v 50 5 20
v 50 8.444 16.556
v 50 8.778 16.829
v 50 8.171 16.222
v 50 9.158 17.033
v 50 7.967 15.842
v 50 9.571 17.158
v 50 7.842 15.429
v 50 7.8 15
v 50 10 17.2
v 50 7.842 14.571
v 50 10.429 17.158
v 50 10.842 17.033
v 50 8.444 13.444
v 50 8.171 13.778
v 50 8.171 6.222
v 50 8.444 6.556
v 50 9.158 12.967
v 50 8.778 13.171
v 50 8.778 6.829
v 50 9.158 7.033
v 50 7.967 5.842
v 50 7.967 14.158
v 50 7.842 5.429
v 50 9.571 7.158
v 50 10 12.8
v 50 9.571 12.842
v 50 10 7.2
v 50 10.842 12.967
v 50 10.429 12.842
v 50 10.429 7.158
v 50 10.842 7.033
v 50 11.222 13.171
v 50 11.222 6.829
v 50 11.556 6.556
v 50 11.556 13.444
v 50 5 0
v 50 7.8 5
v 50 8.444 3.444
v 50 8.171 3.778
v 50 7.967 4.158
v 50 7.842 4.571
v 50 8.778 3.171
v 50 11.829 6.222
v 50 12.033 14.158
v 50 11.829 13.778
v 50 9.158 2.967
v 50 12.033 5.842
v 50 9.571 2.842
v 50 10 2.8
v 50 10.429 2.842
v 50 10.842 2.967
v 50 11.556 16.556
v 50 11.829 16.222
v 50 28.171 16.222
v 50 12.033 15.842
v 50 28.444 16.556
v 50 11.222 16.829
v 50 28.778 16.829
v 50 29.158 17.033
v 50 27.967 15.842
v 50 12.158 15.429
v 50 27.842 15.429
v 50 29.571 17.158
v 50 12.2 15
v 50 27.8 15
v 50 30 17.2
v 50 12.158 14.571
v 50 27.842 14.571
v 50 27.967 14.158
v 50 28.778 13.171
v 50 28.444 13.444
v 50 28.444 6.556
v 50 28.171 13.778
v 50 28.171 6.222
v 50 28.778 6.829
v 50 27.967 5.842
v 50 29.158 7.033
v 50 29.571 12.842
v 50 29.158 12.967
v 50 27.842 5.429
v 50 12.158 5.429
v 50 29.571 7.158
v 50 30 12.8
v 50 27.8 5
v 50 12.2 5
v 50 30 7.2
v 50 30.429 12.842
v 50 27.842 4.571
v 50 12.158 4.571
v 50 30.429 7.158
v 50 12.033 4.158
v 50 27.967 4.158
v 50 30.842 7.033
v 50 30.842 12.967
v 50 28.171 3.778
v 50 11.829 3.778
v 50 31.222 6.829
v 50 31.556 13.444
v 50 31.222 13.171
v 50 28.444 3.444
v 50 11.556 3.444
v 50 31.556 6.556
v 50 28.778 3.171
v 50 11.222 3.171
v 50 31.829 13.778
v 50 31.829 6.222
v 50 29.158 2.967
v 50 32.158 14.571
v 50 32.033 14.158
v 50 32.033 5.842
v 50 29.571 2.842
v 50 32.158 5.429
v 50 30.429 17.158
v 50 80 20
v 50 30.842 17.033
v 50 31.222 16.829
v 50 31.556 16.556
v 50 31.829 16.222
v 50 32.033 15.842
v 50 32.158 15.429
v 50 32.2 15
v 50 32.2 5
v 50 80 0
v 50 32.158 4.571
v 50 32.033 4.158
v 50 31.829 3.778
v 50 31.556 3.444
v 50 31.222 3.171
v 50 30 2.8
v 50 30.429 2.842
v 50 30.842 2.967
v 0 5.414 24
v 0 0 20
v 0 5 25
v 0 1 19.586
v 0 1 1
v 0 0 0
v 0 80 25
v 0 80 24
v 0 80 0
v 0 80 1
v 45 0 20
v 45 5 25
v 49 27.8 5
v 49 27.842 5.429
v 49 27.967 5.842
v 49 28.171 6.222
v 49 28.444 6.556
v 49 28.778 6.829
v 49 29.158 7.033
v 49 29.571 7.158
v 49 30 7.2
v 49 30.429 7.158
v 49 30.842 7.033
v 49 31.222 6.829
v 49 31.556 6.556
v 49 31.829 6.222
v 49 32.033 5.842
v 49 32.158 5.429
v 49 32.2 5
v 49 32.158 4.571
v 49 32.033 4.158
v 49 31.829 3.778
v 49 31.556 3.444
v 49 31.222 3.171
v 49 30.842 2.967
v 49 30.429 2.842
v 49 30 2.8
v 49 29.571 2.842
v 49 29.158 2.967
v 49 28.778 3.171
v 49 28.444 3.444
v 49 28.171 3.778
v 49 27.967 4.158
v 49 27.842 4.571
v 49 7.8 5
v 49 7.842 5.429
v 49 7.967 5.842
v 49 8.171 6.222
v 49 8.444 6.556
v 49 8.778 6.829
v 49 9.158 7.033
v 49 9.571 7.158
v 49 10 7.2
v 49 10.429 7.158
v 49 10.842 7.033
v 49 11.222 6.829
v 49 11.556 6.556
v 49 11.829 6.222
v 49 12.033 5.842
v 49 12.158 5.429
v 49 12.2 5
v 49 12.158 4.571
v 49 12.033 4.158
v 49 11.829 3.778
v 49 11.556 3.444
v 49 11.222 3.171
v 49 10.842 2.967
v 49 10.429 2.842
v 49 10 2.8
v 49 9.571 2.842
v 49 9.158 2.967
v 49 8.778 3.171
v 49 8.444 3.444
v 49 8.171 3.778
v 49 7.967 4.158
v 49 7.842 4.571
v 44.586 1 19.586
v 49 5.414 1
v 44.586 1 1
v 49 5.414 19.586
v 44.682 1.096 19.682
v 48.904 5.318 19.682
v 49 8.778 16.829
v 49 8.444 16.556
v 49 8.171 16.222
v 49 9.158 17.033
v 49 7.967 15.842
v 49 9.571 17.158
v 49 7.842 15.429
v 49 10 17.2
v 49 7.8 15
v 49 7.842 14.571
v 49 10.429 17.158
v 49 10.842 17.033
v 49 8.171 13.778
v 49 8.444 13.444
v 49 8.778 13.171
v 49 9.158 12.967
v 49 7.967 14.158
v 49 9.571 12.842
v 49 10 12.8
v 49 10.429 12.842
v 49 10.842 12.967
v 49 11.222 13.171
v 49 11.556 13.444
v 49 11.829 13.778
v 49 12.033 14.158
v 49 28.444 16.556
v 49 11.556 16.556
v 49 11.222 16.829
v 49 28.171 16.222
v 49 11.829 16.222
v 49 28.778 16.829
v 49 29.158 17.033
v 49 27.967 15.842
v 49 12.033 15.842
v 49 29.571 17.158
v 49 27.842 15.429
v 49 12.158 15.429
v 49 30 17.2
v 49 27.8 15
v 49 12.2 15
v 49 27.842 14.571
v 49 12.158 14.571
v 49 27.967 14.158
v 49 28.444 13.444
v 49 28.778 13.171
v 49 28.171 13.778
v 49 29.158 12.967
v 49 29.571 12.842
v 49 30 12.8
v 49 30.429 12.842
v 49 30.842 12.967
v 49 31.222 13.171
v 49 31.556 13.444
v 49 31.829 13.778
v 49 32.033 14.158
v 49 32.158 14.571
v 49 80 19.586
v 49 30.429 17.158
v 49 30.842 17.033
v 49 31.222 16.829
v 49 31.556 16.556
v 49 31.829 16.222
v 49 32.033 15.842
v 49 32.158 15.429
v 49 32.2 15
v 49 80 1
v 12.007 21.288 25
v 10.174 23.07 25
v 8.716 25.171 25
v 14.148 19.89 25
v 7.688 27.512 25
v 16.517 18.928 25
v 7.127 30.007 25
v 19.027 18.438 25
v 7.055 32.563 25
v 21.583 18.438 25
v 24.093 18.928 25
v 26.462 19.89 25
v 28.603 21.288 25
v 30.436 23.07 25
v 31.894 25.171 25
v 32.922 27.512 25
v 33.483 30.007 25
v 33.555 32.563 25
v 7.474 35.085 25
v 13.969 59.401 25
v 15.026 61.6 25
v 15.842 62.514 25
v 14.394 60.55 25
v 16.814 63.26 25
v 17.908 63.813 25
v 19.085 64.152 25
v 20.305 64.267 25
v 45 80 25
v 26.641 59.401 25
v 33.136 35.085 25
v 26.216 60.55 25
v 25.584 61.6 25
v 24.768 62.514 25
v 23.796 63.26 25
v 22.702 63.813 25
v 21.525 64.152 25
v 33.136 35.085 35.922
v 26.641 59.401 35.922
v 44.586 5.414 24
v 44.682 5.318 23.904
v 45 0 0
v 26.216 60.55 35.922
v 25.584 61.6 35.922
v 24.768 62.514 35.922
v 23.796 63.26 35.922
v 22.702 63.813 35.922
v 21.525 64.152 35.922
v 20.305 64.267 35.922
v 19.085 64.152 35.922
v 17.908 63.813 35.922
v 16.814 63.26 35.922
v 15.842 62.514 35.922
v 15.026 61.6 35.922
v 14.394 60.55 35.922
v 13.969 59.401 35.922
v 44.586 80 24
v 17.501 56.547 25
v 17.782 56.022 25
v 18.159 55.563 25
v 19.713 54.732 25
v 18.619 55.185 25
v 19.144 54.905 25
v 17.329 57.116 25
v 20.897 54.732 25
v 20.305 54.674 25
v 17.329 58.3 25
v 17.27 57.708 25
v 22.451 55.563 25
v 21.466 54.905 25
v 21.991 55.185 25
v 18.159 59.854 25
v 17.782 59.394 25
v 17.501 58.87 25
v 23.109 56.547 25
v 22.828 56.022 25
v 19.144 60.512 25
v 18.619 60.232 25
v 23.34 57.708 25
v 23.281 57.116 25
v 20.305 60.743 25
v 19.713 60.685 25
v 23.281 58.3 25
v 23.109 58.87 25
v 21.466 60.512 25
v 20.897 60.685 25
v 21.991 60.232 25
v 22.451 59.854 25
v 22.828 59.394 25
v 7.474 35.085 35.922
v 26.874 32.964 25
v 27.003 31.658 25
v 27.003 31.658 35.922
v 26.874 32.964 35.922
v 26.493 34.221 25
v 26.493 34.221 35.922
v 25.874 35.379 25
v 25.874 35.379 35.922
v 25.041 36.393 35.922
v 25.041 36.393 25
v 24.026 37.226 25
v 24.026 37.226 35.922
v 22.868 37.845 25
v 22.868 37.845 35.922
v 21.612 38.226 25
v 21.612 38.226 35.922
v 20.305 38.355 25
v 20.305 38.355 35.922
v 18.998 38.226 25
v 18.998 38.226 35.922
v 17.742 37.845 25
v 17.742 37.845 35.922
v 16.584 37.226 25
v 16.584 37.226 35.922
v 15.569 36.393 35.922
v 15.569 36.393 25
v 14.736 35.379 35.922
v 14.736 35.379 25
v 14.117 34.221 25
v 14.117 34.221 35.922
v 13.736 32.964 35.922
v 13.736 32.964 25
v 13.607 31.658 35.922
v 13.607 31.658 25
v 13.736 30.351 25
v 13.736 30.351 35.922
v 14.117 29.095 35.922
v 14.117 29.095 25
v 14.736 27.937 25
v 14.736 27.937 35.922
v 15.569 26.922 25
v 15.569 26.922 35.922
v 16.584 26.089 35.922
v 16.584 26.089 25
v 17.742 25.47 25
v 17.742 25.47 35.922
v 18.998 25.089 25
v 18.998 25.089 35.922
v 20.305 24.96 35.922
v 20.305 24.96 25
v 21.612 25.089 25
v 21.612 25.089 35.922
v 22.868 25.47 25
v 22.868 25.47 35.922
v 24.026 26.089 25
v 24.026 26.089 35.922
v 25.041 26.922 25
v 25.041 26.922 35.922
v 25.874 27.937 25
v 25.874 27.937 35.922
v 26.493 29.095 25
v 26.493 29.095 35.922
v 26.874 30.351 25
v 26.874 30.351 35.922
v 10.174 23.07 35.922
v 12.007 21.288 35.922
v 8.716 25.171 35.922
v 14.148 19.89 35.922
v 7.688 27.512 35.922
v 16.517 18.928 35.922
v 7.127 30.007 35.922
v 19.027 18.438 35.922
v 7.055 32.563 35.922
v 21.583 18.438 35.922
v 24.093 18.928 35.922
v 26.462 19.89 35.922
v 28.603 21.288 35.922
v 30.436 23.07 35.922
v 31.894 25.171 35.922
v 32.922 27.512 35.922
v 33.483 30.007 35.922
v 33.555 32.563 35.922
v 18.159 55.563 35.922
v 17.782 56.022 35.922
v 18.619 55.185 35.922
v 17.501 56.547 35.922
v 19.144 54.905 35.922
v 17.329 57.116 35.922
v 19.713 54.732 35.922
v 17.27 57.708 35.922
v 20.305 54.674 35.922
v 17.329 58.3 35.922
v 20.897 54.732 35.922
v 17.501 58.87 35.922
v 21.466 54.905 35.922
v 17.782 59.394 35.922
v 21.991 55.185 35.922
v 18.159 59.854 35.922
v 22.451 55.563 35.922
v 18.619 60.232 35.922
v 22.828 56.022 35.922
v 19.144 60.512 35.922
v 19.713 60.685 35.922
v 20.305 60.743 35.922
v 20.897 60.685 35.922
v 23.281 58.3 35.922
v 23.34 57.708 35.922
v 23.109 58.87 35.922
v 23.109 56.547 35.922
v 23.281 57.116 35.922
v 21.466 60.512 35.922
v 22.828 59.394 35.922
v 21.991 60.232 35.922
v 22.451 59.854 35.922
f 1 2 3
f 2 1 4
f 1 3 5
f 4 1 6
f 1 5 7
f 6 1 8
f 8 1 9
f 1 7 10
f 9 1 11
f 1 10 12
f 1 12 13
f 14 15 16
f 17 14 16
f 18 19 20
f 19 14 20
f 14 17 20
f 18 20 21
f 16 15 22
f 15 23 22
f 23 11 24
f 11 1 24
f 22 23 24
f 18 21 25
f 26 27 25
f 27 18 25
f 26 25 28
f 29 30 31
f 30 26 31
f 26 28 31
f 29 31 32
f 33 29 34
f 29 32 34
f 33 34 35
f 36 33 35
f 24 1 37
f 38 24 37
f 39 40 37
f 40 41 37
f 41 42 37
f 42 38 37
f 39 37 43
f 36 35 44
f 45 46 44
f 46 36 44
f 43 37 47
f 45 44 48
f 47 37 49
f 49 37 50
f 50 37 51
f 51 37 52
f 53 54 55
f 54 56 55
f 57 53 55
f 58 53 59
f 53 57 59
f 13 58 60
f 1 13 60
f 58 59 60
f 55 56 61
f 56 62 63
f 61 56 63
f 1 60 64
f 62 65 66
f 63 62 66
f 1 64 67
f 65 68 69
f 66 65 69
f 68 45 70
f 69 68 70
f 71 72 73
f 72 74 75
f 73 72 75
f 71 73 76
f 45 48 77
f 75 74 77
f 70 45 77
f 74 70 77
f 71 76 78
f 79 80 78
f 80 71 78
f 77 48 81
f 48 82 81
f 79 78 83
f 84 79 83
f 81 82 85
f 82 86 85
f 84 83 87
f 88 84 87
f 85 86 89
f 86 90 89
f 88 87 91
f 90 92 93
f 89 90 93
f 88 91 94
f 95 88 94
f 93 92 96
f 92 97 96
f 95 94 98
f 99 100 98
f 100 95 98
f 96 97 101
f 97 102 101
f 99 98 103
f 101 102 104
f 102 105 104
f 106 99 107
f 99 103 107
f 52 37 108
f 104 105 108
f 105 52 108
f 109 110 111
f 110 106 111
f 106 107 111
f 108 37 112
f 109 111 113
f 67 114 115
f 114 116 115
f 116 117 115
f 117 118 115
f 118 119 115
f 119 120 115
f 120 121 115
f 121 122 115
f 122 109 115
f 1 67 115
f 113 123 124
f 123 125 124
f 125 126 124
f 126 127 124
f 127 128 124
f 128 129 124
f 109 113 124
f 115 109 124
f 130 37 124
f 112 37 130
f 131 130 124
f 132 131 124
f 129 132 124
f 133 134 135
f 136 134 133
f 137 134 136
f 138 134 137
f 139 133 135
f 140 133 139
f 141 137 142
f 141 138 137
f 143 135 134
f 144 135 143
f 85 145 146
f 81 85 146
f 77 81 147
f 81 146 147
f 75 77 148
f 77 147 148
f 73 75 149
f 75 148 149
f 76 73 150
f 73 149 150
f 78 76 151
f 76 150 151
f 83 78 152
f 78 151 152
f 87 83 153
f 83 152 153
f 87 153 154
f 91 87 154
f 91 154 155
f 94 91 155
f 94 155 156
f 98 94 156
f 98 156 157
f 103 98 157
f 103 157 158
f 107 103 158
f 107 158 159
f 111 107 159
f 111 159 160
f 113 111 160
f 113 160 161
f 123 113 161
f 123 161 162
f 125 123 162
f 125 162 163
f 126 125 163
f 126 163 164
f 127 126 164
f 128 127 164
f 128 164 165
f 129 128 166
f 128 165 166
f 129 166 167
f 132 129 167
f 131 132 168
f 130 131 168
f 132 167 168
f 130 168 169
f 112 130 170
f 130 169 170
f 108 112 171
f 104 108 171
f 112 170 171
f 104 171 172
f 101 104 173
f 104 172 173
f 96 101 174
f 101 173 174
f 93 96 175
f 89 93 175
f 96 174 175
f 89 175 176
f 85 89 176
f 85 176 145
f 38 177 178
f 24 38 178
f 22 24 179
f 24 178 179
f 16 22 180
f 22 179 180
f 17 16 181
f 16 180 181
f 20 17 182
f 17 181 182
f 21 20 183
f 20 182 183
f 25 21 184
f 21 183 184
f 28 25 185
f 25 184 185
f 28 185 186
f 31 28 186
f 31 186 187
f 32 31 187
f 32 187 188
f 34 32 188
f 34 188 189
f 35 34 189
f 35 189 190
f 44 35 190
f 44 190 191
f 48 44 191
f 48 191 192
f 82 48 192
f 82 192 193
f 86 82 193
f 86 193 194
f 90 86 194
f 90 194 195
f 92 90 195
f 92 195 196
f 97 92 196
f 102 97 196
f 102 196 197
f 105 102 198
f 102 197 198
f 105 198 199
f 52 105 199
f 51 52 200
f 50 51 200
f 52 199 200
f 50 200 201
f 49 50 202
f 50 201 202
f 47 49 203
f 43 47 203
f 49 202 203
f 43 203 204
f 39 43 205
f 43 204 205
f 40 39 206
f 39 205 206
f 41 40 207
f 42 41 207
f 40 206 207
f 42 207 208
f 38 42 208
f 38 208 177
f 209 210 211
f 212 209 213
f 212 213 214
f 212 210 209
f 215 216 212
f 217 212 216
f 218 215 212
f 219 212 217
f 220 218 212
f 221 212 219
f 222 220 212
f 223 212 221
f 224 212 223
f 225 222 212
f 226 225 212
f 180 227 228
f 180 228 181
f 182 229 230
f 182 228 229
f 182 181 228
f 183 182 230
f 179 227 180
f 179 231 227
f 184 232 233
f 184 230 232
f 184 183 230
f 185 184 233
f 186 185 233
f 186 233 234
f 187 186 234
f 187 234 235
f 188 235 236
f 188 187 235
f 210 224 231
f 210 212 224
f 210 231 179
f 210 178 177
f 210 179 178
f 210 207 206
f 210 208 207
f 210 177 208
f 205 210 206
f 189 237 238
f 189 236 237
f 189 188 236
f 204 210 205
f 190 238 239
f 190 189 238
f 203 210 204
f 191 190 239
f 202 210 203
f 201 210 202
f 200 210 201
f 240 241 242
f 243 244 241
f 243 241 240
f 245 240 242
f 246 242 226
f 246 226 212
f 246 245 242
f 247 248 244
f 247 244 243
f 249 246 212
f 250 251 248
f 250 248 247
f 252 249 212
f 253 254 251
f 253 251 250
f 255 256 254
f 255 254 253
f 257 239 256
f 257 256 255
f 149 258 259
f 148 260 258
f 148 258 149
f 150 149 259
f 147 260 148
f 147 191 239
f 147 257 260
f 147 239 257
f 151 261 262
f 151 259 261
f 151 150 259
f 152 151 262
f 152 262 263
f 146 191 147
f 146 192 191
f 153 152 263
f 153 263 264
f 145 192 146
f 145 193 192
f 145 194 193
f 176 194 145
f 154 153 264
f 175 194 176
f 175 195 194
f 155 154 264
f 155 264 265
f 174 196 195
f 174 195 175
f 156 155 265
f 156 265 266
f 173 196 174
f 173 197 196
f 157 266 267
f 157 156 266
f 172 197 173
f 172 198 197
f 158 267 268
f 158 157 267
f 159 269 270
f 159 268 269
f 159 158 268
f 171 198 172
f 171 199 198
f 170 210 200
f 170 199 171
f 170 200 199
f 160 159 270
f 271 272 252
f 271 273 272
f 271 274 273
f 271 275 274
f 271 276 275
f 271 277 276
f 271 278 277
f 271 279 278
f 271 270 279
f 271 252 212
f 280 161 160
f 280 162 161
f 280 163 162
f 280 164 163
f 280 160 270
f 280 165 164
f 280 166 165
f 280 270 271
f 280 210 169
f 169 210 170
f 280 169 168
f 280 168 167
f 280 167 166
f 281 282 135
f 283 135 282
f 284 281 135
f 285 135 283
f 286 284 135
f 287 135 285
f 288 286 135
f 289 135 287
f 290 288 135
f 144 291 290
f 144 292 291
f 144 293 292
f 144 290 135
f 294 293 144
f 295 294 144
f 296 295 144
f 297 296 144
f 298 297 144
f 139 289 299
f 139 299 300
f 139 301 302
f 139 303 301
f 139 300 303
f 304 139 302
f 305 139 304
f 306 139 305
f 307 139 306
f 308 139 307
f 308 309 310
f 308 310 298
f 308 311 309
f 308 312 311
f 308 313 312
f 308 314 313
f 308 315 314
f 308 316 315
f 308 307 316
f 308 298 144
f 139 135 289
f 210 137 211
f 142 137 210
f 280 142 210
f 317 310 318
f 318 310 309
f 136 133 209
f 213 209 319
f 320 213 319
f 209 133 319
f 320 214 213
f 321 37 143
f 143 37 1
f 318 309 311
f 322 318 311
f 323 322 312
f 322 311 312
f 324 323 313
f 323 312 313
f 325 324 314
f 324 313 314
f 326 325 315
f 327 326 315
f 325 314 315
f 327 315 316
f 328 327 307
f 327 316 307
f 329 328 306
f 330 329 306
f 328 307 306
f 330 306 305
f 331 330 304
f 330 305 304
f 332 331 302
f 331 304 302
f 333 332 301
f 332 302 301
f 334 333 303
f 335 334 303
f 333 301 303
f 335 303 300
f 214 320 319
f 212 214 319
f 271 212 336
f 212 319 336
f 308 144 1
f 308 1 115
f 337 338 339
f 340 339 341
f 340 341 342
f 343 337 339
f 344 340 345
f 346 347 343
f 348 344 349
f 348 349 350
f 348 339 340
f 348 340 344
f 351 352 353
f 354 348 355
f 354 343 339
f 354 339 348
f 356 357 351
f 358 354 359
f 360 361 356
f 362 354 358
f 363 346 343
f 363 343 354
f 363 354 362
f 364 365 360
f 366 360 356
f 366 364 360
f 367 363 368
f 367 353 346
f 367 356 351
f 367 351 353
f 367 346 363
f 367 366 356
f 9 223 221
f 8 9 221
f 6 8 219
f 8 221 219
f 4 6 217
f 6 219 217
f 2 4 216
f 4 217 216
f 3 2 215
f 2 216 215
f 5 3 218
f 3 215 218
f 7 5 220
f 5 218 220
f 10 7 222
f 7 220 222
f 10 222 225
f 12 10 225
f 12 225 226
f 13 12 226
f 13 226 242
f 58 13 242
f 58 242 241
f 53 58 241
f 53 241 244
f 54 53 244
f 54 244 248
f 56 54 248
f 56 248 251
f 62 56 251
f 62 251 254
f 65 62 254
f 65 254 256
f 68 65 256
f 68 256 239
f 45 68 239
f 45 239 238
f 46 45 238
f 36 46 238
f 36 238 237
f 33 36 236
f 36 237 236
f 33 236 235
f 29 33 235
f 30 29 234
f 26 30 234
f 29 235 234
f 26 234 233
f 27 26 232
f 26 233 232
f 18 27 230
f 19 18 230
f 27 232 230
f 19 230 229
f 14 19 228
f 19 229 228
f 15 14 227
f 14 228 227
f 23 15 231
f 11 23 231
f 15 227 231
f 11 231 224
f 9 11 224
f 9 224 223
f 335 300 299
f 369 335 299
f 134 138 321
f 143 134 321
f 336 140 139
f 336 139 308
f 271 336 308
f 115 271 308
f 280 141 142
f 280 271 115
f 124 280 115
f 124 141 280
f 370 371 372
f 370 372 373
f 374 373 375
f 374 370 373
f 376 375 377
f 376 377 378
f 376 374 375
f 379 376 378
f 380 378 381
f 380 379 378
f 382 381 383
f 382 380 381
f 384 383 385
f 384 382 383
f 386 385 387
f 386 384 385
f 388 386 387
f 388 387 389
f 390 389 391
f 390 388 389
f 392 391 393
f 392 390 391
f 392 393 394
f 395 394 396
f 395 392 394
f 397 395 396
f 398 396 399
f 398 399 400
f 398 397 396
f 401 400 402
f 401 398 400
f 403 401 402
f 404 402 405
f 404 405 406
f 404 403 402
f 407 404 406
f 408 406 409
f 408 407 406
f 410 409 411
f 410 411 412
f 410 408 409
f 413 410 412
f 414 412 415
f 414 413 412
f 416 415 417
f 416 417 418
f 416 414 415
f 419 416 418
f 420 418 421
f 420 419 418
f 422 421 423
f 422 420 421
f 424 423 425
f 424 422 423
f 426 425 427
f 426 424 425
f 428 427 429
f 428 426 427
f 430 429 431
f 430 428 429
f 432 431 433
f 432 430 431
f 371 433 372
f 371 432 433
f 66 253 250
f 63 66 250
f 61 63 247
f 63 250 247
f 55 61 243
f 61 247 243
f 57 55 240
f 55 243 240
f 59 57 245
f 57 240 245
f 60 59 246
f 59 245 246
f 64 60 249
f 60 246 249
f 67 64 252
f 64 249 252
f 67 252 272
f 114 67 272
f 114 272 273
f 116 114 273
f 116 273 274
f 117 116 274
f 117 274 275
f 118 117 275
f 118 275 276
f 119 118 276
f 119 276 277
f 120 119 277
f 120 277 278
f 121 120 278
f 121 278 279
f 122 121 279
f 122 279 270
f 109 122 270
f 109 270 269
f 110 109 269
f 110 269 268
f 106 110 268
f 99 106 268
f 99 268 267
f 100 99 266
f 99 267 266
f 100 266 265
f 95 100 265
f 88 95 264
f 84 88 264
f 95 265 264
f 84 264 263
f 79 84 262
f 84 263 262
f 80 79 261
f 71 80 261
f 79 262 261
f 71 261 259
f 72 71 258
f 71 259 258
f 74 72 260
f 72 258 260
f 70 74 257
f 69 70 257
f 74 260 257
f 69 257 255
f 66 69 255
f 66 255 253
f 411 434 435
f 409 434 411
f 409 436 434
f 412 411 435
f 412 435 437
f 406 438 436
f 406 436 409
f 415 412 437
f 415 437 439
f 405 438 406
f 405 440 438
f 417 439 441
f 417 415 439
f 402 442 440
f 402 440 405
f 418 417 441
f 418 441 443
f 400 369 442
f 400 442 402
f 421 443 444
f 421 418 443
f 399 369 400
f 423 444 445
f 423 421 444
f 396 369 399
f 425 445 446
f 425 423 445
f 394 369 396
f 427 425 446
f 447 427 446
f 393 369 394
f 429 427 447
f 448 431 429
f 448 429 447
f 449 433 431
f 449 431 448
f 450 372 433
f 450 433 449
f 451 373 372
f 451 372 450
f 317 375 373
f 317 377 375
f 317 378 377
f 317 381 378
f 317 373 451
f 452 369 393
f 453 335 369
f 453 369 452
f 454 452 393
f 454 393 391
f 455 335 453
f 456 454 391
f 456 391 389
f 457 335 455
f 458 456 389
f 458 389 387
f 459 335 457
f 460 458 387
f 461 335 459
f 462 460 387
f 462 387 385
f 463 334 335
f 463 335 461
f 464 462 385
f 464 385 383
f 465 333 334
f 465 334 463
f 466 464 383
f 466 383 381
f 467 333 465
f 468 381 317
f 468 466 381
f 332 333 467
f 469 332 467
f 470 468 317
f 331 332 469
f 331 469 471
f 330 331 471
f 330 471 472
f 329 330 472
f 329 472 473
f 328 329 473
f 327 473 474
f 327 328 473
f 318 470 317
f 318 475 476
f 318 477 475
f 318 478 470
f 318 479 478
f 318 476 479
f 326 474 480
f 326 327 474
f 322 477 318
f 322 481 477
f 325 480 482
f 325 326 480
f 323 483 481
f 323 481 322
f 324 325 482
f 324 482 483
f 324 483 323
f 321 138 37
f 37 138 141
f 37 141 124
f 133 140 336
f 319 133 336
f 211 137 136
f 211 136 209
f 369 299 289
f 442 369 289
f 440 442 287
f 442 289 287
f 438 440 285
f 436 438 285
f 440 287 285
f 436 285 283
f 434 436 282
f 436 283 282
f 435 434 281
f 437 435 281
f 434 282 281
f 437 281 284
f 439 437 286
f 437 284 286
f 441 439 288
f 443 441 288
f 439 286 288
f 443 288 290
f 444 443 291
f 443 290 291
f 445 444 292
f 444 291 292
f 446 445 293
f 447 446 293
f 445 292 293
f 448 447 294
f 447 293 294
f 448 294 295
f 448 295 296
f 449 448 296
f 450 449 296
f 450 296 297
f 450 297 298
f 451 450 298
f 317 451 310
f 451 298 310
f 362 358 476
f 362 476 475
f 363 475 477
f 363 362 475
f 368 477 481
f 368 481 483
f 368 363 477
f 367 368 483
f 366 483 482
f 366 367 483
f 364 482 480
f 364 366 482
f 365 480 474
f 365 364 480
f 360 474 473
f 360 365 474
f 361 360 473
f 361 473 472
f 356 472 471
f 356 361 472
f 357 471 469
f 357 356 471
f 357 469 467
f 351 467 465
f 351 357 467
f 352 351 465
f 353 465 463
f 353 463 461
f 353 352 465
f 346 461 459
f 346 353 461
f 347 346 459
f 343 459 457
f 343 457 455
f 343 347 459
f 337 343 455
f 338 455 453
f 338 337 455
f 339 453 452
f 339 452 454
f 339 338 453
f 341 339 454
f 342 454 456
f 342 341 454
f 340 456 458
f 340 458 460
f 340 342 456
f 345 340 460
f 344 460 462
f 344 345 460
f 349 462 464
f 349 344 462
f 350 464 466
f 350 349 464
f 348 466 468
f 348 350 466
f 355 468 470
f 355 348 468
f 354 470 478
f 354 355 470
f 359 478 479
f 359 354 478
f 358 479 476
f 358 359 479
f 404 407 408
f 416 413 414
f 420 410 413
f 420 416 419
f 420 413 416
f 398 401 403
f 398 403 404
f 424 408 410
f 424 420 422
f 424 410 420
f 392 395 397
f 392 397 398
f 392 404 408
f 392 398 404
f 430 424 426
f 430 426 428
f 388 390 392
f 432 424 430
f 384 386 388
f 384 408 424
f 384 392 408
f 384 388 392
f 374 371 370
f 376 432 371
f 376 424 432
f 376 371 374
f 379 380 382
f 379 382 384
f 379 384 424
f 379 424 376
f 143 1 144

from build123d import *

# Parameters (mm, degrees)
F0_W     = 50
F0_H     = 80
F7_DEPTH = 25
F1_SIZE  = 5
F2_T     = -1
F3_R     = 6.6975560133
F3_R_2   = 3.0346294706
F4_DEPTH = 10.92156
F6_D     = 4.4


with BuildPart() as f7:
    # F0 (on Top) → F7 (new body)
    with BuildSketch(Plane.XY):
        with Locations((25, 40)):
            Rectangle(F0_W, F0_H)
    extrude(amount=F7_DEPTH)

    # F1
    f1_edges = [f7.edges().sort_by_distance(p)[0] for p in [
        (50, 0, 12.5),
        (50, 40, 25),
        (25, 0, 25),
    ]]
    chamfer(f1_edges, length=F1_SIZE)

    # F2
    f2_openings = [f7.faces().sort_by_distance(p)[0] for p in [
        (0, 40.24109, 12.431866),
        (24.76431, 80, 12.390572),
    ]]
    offset(amount=F2_T, openings=f2_openings)

    # F3 (on face) → F4 (join)
    with BuildSketch(Plane.XY.offset(25)):
        with BuildLine():
            Line((33.1360828131, 35.084836185), (26.6411228282, 59.4008081287))
            ThreePointArc((26.6411228282, 59.4008081287), (20.3049834818, 64.2666572246), (13.9688441353, 59.4008081287))
            Line((13.9688441353, 59.4008081287), (7.4738841504, 35.084836185))
            ThreePointArc((7.4738841504, 35.084836185), (20.3049834818, 18.3766251965), (33.1360828131, 35.084836185))
        make_face()
        with Locations((20.3049834818, 31.6575630777)):
            Circle(F3_R, mode=Mode.SUBTRACT)
        with Locations((20.3049834818, 57.7083826065)):
            Circle(F3_R_2, mode=Mode.SUBTRACT)
    extrude(amount=F4_DEPTH)

    # F6 (through all)
    with Locations(Plane.YZ.offset(50)):
        with Locations((10, 15), (30, 15), (30, 5), (10, 5)):
            Hole(F6_D / 2)


solid = f7.part
